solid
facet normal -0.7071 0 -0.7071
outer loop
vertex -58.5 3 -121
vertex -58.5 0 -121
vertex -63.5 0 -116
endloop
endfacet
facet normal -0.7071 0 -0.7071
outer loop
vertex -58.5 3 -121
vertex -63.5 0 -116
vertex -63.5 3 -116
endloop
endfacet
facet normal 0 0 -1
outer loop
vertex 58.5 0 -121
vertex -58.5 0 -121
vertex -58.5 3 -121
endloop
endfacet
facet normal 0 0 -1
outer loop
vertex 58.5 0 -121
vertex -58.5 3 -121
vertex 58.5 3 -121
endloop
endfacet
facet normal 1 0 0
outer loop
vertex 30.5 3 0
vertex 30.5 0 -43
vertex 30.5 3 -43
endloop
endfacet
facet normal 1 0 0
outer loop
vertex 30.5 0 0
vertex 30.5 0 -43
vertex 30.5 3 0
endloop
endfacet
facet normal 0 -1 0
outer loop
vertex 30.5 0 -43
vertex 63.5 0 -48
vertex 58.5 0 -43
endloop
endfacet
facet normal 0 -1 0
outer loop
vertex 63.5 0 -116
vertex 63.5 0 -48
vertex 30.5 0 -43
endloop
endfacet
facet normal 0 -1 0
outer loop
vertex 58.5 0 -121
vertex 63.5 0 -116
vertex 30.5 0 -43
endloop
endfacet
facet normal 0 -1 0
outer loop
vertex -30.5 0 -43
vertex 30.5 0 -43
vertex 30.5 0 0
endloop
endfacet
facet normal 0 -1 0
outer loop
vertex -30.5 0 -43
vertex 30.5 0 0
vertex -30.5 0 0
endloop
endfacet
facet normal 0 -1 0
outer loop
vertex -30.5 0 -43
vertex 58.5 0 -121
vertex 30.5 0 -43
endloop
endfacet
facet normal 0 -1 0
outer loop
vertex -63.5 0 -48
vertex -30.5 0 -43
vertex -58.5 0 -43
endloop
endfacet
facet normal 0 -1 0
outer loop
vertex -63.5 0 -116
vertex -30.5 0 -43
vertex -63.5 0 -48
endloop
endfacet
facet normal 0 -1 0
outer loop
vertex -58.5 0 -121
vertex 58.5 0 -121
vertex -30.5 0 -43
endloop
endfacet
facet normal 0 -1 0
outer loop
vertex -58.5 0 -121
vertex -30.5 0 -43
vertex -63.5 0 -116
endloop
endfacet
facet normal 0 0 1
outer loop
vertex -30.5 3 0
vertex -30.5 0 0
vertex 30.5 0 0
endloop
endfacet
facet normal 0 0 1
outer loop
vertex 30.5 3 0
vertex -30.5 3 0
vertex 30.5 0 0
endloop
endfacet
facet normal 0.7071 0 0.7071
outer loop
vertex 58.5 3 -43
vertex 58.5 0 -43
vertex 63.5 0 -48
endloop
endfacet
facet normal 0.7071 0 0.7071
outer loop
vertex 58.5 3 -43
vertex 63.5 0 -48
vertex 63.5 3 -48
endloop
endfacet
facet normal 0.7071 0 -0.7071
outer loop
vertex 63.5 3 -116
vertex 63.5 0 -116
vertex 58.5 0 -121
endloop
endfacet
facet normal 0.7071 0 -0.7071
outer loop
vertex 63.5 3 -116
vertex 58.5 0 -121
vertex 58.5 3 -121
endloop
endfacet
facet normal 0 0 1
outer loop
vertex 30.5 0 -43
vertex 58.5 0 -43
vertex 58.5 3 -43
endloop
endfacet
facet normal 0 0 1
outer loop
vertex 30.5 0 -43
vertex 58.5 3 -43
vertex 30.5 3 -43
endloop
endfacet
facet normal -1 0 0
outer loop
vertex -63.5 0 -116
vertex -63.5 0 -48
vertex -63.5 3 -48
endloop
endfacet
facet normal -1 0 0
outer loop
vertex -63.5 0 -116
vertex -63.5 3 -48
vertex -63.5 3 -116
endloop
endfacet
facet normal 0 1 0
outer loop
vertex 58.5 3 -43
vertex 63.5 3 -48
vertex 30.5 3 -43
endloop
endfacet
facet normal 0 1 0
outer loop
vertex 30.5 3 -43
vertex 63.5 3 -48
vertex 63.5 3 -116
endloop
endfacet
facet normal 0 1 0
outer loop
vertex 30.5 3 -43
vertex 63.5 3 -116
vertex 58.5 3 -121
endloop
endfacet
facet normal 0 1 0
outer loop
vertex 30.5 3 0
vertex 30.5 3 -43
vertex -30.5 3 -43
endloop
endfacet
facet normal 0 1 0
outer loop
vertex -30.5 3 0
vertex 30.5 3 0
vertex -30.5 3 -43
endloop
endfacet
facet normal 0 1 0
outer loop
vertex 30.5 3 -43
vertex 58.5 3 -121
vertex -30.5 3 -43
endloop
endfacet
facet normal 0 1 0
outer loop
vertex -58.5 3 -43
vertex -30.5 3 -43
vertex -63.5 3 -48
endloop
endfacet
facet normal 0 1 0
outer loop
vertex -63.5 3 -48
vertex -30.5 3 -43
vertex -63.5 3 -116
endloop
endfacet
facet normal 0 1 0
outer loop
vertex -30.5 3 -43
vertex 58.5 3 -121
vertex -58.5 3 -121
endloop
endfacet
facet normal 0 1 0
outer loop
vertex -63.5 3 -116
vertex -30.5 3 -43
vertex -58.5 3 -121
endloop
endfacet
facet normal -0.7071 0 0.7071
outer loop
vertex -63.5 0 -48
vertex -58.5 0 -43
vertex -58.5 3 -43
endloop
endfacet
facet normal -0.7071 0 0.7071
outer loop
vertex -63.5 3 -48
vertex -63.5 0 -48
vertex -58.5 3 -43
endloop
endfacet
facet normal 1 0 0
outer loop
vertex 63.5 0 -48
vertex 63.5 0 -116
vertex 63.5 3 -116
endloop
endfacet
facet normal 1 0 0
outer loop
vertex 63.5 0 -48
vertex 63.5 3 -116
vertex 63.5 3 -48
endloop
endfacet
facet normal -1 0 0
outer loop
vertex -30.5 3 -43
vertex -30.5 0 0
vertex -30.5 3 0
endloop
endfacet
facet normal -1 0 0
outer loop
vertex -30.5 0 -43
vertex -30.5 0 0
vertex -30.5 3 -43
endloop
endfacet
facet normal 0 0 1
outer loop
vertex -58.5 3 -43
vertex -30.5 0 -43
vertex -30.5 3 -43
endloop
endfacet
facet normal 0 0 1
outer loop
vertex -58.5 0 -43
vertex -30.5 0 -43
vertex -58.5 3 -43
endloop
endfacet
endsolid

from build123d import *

# Parameters (mm, degrees)
BOSS_EXTRU_1_DEPTH = 3
CHANFREIN1_SIZE    = 5


with BuildPart() as part:
    # Esquisse1 → Boss.-Extru.1 (new body)
    with BuildSketch(Plane(origin=(0, 0, 0), x_dir=(1, 0, 0), z_dir=(0, 1, 0))):
        Polygon((0, 0), (-30.5, 0), (-30.5, 43), (-63.5, 43), (-63.5, 121), (63.5, 121), (63.5, 43), (30.5, 43), (30.5, 0), align=None)
    extrude(amount=BOSS_EXTRU_1_DEPTH)

    # Chanfrein1
    chanfrein1_edges = [part.edges().sort_by_distance(p)[0] for p in [
        (-63.5, 1.5, -43),
        (-63.5, 1.5, -121),
        (63.5, 1.5, -121),
        (63.5, 1.5, -43),
    ]]
    chamfer(chanfrein1_edges, length=CHANFREIN1_SIZE)


solid = part.part
